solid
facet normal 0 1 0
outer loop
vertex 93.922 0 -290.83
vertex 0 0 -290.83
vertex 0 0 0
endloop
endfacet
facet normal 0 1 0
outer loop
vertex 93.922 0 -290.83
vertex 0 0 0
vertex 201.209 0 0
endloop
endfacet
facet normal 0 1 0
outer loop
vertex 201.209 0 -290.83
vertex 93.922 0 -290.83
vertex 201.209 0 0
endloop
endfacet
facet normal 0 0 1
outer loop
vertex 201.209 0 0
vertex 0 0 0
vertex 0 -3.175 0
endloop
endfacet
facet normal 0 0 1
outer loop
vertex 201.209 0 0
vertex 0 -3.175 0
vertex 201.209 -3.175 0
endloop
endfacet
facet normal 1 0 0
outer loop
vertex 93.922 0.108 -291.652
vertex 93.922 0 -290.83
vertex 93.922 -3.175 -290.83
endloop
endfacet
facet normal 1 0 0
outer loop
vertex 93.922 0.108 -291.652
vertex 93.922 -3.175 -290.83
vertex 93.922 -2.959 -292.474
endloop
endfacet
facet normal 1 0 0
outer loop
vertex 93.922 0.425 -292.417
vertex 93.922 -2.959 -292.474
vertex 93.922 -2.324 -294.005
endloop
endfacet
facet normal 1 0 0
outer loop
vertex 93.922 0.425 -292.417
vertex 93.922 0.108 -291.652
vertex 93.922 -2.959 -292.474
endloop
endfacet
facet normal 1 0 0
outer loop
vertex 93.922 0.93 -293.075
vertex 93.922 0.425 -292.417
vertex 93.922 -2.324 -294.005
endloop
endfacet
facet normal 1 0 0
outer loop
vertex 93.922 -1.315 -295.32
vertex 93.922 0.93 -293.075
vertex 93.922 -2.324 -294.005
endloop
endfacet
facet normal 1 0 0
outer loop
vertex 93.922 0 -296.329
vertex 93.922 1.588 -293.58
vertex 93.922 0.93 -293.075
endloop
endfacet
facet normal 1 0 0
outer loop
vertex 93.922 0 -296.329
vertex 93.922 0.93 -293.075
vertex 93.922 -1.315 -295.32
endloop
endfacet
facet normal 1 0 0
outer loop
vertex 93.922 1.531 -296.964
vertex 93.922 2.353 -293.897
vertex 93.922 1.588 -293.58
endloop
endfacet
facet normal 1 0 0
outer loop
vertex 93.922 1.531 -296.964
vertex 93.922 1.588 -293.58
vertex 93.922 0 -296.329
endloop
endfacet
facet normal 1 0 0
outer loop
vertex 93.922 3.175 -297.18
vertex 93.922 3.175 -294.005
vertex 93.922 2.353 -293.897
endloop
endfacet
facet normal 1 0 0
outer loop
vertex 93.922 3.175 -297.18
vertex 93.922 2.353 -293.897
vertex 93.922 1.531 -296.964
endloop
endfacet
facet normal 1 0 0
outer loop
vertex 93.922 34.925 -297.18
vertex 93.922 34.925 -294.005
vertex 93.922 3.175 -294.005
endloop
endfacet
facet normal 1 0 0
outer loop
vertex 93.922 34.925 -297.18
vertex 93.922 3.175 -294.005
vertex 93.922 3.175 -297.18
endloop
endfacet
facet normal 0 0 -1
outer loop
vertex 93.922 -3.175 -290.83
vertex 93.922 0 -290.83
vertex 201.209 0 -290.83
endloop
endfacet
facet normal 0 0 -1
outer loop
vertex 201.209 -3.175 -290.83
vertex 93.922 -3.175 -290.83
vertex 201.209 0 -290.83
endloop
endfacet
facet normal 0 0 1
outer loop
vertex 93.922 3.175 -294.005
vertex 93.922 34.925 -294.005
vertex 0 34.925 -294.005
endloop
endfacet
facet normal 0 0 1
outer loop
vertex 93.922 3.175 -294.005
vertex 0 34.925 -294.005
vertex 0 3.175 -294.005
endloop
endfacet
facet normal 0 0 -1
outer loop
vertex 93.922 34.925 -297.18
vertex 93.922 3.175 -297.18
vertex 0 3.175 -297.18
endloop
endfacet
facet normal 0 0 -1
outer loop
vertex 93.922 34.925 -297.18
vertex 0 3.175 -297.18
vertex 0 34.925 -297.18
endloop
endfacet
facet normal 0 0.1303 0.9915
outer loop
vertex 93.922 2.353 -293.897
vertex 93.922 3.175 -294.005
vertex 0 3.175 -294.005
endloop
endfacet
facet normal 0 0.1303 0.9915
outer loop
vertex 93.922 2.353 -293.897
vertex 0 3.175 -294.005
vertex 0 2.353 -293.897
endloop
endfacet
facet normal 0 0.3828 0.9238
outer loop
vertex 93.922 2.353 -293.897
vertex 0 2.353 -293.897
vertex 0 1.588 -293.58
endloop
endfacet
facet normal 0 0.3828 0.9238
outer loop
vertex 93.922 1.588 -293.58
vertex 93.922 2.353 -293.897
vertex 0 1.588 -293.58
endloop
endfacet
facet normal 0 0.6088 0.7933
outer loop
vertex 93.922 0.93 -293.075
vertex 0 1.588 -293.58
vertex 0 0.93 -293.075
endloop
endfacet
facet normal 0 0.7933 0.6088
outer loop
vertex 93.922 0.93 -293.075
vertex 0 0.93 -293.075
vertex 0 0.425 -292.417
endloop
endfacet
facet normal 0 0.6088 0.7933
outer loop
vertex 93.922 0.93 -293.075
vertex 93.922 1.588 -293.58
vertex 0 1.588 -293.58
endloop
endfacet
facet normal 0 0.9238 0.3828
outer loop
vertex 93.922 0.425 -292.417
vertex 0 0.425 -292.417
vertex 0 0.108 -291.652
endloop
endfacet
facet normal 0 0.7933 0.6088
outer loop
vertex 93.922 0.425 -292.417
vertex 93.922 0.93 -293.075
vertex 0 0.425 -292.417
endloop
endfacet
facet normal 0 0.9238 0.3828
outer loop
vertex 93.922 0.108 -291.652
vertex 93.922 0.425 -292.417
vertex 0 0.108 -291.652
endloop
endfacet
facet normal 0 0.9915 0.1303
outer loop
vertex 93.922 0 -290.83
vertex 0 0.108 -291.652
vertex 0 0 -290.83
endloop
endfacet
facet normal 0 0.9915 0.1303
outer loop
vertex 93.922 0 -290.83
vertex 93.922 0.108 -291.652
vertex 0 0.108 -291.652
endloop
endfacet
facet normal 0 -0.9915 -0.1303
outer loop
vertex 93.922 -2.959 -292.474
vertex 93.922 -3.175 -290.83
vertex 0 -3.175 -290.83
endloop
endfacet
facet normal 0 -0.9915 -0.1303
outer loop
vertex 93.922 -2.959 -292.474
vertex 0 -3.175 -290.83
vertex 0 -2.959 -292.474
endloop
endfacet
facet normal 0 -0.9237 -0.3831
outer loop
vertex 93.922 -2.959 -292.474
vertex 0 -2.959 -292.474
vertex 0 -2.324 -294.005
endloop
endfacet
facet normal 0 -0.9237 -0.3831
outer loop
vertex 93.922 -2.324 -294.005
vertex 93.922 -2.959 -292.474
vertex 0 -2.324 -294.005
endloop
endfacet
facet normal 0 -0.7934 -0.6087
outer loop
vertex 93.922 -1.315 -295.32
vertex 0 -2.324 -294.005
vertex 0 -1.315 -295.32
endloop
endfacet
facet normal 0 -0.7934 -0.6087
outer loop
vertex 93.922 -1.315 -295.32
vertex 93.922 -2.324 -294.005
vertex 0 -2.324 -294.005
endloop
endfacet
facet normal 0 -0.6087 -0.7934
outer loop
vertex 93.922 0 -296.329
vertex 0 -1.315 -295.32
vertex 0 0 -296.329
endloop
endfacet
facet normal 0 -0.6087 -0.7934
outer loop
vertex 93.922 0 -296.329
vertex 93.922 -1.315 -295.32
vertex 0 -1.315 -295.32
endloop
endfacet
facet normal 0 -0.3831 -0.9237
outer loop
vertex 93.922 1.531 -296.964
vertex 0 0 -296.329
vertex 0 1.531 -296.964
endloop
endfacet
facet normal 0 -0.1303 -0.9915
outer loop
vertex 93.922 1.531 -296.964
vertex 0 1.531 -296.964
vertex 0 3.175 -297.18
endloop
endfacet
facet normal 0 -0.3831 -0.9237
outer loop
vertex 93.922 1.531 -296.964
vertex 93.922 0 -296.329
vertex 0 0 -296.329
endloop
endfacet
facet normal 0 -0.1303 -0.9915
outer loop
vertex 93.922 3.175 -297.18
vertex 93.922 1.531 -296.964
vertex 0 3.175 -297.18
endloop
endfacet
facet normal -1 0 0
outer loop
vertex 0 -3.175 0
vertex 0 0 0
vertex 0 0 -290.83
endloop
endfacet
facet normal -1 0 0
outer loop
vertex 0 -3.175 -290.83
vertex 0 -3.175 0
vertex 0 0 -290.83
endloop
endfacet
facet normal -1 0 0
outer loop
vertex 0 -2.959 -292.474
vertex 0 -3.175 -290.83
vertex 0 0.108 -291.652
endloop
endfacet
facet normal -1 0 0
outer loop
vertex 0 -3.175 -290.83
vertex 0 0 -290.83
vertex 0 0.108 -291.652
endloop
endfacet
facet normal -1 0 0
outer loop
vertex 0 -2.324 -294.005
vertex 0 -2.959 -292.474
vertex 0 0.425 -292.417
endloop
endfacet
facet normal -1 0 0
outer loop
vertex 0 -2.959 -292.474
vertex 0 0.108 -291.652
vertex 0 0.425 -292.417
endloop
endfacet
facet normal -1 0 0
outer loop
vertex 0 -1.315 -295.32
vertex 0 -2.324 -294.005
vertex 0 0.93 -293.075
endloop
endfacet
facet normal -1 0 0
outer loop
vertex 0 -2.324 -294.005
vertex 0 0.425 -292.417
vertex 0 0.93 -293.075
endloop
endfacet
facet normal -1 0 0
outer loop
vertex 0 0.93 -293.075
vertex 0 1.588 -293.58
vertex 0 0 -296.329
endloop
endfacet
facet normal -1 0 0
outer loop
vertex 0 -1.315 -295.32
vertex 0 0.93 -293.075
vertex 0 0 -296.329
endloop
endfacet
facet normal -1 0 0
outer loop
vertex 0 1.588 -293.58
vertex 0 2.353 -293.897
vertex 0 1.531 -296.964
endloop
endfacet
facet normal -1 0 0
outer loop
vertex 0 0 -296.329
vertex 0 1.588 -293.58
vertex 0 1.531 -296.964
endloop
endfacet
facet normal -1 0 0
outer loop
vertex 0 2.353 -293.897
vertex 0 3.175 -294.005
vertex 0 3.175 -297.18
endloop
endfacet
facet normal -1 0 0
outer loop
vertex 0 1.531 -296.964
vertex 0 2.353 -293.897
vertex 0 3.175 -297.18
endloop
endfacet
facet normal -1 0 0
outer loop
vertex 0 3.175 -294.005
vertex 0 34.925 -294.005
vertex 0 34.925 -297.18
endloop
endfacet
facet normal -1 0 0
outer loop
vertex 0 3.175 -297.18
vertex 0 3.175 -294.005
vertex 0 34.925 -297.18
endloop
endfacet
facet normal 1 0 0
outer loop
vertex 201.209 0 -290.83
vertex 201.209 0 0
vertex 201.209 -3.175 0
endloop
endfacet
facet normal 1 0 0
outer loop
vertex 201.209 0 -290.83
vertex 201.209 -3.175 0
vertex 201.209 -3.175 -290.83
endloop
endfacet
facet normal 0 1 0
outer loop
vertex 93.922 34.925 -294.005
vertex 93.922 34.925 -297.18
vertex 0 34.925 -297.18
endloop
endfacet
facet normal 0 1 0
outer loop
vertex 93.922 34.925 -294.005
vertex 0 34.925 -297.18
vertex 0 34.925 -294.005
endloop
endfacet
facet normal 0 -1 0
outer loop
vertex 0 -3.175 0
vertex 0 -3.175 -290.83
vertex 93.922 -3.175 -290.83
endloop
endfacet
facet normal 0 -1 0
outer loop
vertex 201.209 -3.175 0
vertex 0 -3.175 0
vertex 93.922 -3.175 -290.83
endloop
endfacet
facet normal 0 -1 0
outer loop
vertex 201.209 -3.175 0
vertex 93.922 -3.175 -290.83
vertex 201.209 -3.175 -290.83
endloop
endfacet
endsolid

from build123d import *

# Parameters (mm, degrees)
SKETCH1_W          = 201.20864
SKETCH1_H          = 290.83
BASE_FLANGE1_DEPTH = 3.175
EDGE_FLANGE1_DEPTH = 93.921520056


# Sheet-metal steps are written as plain solids
with BuildPart() as part:
    # Sketch1 → Base-Flange1 (new body)
    with BuildSketch(Plane(origin=(0, 0, 0), x_dir=(1, 0, 0), z_dir=(0, 1, 0))):
        with Locations((100.60432, 145.415)):
            Rectangle(SKETCH1_W, SKETCH1_H)
    extrude(amount=-BASE_FLANGE1_DEPTH)

    # Edge-Flange1 section (across the edge) → Edge-Flange1 (add)
    with BuildSketch(Plane(origin=(93.921520056, 0, -294.005), x_dir=(0, 0, 1), z_dir=(-1, 0, 0))):
        with BuildLine():
            Line((-3.175, 3.175), (-3.175, 34.925))
            Line((-3.175, 34.925), (0, 34.925))
            Line((0, 34.925), (0, 3.175))
            ThreePointArc((0, 3.175), (0.92993597, 0.92993597), (3.175, 0))
            Line((3.175, 0), (3.175, -3.175))
            ThreePointArc((3.175, -3.175), (-1.315128061, -1.315128061), (-3.175, 3.175))
        make_face()
    extrude(amount=EDGE_FLANGE1_DEPTH)


solid = part.part
